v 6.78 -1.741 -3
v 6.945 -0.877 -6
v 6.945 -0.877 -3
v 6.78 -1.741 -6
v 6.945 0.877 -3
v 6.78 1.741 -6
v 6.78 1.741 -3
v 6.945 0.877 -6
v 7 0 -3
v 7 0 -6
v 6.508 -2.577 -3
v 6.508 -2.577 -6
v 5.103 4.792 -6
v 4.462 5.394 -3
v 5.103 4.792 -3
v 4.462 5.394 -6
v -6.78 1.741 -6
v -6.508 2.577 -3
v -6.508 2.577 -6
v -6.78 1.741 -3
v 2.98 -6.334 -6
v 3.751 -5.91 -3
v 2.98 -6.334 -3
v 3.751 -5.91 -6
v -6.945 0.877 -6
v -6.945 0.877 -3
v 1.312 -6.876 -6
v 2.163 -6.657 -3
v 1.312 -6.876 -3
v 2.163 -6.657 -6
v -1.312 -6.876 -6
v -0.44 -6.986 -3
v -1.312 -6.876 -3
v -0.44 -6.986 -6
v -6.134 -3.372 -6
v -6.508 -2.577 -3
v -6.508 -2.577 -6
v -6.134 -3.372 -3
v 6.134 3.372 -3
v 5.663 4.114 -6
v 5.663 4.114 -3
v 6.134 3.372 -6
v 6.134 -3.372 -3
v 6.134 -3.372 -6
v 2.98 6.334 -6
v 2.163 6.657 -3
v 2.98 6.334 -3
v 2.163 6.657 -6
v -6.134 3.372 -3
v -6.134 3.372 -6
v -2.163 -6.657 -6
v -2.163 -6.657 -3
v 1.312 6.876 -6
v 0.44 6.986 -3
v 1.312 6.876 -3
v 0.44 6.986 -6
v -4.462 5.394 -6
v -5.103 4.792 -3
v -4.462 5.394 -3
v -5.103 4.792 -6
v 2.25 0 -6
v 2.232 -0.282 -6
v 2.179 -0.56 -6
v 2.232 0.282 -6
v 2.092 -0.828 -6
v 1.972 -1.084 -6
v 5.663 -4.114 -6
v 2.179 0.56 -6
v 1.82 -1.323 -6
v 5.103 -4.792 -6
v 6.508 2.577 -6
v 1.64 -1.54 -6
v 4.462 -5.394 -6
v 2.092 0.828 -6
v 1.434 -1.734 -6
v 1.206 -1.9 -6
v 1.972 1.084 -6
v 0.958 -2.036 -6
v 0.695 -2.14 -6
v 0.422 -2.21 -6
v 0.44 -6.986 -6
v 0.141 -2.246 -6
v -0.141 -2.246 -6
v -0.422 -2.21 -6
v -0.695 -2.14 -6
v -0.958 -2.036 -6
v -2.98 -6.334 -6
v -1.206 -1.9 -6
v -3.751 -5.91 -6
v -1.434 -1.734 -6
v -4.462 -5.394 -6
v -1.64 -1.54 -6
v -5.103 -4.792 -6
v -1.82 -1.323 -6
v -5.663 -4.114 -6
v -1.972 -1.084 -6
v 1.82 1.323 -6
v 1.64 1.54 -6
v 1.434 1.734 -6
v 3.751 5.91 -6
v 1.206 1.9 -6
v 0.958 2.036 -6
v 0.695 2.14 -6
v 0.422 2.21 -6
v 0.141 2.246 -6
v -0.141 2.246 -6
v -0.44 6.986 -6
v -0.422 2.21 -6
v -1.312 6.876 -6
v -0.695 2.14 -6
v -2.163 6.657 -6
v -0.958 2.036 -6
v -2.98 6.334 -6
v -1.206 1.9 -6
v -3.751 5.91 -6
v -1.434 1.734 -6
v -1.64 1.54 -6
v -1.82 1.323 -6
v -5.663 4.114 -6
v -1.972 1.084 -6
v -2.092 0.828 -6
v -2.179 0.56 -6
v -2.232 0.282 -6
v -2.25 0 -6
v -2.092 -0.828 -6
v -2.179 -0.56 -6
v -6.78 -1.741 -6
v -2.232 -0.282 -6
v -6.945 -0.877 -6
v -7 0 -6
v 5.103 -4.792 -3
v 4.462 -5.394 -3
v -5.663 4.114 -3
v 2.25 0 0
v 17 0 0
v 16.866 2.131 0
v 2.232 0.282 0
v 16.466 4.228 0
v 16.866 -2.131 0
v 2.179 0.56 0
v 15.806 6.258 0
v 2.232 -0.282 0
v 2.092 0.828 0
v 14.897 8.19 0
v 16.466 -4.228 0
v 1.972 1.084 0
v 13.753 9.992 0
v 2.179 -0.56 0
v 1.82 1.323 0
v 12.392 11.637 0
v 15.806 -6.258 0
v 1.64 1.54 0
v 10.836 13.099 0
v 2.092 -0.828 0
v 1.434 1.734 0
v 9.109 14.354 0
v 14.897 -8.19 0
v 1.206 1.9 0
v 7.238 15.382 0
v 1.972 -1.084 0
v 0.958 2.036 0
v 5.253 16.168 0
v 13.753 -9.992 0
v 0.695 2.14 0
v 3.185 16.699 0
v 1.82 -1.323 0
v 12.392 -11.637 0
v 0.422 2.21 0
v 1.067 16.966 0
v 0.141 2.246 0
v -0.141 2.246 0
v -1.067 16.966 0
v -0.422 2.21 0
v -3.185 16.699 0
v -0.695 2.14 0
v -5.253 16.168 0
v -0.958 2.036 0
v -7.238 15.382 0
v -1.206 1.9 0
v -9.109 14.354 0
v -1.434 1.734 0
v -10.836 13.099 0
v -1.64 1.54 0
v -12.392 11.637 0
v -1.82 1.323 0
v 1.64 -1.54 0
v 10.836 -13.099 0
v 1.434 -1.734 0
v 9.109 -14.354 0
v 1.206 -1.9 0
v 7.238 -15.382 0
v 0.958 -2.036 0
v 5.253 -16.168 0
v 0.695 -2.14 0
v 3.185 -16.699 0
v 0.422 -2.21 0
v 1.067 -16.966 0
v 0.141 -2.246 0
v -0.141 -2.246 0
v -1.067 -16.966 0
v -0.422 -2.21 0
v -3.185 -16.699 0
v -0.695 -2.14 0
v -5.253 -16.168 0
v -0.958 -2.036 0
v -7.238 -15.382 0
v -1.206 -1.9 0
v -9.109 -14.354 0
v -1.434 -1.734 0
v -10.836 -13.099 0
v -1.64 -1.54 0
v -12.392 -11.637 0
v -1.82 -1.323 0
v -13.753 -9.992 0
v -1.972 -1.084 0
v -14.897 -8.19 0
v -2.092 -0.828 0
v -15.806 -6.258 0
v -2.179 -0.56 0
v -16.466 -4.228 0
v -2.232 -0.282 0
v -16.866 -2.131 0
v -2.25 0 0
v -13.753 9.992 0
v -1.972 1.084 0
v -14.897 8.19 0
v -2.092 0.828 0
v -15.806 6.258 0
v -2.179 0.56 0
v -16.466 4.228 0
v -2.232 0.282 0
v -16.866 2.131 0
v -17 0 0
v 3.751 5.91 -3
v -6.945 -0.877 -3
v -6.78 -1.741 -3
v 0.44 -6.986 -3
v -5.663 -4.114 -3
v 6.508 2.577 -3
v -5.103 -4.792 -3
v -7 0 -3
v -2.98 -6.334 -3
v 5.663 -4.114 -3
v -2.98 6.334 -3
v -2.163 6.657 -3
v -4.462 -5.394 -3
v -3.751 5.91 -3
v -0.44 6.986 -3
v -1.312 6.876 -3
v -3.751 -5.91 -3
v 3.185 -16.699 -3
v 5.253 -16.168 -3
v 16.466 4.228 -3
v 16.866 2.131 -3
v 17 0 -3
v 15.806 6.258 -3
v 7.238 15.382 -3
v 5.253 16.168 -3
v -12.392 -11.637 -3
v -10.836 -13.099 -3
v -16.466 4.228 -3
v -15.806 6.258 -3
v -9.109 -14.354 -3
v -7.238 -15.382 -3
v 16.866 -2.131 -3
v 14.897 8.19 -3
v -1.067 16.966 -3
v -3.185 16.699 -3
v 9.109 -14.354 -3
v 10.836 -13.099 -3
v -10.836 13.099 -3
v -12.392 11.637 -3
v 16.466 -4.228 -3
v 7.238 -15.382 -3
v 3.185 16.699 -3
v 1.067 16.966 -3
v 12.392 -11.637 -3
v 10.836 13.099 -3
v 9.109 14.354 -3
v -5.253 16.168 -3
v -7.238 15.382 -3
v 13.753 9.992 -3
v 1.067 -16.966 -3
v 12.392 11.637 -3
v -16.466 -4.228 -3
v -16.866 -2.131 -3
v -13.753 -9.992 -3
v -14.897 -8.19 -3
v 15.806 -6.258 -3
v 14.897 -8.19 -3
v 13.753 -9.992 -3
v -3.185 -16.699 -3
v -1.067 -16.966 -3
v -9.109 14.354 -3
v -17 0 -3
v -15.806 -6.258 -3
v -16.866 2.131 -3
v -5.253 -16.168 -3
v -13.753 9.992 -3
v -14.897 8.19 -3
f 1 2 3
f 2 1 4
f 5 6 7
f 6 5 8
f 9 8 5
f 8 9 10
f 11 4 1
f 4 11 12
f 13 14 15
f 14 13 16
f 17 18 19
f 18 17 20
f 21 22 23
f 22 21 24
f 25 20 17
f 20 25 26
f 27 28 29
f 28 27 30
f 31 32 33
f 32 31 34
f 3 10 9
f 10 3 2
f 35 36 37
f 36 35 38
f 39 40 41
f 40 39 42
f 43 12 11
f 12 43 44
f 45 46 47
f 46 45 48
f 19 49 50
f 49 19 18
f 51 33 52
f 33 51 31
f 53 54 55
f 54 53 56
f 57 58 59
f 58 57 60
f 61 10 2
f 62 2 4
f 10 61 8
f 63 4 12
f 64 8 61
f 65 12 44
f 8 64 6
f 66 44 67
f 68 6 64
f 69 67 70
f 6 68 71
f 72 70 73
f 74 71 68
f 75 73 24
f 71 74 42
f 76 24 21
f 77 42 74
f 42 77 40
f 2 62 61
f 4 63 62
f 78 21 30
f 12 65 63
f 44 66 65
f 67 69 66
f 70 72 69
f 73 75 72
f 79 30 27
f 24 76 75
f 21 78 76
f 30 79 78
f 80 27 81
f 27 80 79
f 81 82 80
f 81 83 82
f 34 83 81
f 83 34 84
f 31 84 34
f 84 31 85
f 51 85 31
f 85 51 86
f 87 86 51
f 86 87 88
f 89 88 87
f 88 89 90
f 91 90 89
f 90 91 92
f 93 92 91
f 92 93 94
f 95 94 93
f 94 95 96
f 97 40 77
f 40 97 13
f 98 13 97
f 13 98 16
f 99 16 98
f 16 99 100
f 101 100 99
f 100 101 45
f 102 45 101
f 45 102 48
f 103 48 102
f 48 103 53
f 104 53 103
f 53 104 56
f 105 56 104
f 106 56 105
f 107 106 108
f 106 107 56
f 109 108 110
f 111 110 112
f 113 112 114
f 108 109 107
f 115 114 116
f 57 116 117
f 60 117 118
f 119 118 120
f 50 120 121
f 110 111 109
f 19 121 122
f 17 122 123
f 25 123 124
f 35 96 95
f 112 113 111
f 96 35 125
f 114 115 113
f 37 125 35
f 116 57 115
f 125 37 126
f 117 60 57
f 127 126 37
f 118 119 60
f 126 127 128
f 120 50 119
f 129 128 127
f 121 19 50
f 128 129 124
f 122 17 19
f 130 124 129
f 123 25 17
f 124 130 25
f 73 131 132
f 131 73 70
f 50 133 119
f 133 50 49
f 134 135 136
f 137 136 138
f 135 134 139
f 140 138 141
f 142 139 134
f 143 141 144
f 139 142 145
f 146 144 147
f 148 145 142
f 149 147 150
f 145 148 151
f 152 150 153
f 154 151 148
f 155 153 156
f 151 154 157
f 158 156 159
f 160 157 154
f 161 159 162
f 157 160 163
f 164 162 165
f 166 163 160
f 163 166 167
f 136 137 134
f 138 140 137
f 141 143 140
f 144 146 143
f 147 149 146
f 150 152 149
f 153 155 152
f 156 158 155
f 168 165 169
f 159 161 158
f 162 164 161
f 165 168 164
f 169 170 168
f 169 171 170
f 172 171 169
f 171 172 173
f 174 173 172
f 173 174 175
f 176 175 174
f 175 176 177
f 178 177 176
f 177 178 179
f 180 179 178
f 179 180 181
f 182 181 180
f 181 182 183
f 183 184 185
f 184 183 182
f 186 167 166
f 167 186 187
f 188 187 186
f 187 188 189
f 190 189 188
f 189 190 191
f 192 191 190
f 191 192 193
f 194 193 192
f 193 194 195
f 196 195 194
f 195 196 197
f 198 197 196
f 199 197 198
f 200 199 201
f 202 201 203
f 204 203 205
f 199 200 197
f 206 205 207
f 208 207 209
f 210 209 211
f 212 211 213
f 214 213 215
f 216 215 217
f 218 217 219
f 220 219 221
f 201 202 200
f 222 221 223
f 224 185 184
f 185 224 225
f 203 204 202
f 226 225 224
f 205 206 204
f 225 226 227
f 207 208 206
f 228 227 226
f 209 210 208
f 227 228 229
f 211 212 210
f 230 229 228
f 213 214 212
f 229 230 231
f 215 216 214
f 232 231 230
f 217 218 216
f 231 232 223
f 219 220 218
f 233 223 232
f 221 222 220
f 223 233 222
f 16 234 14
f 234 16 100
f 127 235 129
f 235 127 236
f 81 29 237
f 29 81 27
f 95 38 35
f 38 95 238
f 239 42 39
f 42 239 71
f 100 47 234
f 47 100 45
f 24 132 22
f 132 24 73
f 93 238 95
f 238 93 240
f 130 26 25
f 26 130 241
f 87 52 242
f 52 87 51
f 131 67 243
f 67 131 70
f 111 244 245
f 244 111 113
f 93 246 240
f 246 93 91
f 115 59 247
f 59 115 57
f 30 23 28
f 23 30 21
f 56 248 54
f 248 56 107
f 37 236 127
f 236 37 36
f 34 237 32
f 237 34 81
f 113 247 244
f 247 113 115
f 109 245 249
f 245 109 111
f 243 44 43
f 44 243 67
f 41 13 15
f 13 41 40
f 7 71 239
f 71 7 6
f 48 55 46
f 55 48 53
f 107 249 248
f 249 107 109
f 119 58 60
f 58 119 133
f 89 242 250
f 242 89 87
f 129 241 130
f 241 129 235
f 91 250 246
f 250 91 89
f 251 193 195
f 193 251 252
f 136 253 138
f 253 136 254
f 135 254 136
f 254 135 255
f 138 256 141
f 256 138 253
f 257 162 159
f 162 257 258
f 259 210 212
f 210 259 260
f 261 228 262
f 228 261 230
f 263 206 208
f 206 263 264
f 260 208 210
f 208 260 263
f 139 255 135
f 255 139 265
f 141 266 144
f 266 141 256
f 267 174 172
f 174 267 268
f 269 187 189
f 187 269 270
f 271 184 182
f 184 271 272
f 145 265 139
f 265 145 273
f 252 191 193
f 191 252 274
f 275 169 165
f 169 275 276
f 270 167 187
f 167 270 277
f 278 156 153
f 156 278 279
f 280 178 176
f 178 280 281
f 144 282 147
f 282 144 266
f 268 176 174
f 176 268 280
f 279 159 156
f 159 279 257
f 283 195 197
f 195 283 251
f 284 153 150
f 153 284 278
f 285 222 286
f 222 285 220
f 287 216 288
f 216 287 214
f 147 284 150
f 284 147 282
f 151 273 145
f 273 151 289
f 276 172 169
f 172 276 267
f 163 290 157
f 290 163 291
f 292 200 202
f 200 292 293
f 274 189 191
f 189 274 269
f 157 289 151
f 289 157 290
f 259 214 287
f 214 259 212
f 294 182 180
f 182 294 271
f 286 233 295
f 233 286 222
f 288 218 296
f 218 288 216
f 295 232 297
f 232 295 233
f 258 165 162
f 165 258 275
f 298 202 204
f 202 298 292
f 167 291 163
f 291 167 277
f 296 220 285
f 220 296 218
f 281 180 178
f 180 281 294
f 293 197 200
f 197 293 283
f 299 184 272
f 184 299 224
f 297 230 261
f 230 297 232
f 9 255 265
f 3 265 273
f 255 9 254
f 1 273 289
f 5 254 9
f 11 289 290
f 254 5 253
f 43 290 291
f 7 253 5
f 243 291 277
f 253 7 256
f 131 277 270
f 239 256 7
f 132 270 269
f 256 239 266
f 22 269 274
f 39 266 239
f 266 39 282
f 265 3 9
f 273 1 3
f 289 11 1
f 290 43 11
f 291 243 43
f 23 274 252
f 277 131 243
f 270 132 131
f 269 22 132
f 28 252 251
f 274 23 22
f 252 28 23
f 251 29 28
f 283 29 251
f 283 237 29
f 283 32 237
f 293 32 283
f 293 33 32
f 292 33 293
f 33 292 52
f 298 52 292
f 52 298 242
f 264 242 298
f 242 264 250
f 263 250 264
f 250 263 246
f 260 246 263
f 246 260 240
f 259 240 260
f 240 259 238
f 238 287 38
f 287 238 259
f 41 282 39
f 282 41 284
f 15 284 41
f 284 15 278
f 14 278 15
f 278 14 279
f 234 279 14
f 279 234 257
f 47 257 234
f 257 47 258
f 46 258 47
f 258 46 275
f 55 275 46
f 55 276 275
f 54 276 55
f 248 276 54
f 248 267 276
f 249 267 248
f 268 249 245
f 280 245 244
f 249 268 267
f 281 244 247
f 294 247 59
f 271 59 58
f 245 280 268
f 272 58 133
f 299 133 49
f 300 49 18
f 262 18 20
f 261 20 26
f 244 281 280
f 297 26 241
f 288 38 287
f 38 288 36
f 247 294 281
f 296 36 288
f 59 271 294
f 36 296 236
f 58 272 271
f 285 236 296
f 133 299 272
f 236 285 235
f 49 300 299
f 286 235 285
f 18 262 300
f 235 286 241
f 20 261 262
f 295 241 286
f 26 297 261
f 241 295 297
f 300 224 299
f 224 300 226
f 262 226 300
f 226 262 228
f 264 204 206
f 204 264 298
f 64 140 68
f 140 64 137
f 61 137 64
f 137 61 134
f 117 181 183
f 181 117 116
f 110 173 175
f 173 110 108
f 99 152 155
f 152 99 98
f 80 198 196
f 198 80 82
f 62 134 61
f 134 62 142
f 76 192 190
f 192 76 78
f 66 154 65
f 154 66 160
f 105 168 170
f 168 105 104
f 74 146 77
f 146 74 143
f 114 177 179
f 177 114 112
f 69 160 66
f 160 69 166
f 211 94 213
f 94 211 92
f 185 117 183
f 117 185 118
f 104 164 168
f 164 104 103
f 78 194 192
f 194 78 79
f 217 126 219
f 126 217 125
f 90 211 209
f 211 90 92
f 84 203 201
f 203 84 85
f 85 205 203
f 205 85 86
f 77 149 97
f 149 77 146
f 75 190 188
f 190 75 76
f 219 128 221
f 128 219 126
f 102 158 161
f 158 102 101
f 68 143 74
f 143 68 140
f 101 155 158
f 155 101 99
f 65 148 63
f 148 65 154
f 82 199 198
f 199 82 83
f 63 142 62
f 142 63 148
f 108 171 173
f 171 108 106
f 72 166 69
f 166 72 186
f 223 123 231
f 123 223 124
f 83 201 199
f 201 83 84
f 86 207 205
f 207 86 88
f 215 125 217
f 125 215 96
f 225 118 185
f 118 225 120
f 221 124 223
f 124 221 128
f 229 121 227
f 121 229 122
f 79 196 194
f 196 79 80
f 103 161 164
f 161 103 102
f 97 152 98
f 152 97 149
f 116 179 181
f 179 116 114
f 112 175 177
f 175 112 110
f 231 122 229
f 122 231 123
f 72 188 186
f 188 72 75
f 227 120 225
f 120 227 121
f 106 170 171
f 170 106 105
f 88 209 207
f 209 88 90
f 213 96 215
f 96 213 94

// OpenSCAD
$fn = 50;


difference() {
	union() {
		translate(v = [0, 0, -6.0000000000]) {
			cylinder(h = 6, r = 7.0000000000);
		}
		translate(v = [0, 0, -3.0000000000]) {
			cylinder(h = 3, r = 17.0000000000);
		}
	}
	union() {
		#translate(v = [0, 0, -6]) {
			cylinder(h = 6, r = 2.2500000000);
		}
	}
}
